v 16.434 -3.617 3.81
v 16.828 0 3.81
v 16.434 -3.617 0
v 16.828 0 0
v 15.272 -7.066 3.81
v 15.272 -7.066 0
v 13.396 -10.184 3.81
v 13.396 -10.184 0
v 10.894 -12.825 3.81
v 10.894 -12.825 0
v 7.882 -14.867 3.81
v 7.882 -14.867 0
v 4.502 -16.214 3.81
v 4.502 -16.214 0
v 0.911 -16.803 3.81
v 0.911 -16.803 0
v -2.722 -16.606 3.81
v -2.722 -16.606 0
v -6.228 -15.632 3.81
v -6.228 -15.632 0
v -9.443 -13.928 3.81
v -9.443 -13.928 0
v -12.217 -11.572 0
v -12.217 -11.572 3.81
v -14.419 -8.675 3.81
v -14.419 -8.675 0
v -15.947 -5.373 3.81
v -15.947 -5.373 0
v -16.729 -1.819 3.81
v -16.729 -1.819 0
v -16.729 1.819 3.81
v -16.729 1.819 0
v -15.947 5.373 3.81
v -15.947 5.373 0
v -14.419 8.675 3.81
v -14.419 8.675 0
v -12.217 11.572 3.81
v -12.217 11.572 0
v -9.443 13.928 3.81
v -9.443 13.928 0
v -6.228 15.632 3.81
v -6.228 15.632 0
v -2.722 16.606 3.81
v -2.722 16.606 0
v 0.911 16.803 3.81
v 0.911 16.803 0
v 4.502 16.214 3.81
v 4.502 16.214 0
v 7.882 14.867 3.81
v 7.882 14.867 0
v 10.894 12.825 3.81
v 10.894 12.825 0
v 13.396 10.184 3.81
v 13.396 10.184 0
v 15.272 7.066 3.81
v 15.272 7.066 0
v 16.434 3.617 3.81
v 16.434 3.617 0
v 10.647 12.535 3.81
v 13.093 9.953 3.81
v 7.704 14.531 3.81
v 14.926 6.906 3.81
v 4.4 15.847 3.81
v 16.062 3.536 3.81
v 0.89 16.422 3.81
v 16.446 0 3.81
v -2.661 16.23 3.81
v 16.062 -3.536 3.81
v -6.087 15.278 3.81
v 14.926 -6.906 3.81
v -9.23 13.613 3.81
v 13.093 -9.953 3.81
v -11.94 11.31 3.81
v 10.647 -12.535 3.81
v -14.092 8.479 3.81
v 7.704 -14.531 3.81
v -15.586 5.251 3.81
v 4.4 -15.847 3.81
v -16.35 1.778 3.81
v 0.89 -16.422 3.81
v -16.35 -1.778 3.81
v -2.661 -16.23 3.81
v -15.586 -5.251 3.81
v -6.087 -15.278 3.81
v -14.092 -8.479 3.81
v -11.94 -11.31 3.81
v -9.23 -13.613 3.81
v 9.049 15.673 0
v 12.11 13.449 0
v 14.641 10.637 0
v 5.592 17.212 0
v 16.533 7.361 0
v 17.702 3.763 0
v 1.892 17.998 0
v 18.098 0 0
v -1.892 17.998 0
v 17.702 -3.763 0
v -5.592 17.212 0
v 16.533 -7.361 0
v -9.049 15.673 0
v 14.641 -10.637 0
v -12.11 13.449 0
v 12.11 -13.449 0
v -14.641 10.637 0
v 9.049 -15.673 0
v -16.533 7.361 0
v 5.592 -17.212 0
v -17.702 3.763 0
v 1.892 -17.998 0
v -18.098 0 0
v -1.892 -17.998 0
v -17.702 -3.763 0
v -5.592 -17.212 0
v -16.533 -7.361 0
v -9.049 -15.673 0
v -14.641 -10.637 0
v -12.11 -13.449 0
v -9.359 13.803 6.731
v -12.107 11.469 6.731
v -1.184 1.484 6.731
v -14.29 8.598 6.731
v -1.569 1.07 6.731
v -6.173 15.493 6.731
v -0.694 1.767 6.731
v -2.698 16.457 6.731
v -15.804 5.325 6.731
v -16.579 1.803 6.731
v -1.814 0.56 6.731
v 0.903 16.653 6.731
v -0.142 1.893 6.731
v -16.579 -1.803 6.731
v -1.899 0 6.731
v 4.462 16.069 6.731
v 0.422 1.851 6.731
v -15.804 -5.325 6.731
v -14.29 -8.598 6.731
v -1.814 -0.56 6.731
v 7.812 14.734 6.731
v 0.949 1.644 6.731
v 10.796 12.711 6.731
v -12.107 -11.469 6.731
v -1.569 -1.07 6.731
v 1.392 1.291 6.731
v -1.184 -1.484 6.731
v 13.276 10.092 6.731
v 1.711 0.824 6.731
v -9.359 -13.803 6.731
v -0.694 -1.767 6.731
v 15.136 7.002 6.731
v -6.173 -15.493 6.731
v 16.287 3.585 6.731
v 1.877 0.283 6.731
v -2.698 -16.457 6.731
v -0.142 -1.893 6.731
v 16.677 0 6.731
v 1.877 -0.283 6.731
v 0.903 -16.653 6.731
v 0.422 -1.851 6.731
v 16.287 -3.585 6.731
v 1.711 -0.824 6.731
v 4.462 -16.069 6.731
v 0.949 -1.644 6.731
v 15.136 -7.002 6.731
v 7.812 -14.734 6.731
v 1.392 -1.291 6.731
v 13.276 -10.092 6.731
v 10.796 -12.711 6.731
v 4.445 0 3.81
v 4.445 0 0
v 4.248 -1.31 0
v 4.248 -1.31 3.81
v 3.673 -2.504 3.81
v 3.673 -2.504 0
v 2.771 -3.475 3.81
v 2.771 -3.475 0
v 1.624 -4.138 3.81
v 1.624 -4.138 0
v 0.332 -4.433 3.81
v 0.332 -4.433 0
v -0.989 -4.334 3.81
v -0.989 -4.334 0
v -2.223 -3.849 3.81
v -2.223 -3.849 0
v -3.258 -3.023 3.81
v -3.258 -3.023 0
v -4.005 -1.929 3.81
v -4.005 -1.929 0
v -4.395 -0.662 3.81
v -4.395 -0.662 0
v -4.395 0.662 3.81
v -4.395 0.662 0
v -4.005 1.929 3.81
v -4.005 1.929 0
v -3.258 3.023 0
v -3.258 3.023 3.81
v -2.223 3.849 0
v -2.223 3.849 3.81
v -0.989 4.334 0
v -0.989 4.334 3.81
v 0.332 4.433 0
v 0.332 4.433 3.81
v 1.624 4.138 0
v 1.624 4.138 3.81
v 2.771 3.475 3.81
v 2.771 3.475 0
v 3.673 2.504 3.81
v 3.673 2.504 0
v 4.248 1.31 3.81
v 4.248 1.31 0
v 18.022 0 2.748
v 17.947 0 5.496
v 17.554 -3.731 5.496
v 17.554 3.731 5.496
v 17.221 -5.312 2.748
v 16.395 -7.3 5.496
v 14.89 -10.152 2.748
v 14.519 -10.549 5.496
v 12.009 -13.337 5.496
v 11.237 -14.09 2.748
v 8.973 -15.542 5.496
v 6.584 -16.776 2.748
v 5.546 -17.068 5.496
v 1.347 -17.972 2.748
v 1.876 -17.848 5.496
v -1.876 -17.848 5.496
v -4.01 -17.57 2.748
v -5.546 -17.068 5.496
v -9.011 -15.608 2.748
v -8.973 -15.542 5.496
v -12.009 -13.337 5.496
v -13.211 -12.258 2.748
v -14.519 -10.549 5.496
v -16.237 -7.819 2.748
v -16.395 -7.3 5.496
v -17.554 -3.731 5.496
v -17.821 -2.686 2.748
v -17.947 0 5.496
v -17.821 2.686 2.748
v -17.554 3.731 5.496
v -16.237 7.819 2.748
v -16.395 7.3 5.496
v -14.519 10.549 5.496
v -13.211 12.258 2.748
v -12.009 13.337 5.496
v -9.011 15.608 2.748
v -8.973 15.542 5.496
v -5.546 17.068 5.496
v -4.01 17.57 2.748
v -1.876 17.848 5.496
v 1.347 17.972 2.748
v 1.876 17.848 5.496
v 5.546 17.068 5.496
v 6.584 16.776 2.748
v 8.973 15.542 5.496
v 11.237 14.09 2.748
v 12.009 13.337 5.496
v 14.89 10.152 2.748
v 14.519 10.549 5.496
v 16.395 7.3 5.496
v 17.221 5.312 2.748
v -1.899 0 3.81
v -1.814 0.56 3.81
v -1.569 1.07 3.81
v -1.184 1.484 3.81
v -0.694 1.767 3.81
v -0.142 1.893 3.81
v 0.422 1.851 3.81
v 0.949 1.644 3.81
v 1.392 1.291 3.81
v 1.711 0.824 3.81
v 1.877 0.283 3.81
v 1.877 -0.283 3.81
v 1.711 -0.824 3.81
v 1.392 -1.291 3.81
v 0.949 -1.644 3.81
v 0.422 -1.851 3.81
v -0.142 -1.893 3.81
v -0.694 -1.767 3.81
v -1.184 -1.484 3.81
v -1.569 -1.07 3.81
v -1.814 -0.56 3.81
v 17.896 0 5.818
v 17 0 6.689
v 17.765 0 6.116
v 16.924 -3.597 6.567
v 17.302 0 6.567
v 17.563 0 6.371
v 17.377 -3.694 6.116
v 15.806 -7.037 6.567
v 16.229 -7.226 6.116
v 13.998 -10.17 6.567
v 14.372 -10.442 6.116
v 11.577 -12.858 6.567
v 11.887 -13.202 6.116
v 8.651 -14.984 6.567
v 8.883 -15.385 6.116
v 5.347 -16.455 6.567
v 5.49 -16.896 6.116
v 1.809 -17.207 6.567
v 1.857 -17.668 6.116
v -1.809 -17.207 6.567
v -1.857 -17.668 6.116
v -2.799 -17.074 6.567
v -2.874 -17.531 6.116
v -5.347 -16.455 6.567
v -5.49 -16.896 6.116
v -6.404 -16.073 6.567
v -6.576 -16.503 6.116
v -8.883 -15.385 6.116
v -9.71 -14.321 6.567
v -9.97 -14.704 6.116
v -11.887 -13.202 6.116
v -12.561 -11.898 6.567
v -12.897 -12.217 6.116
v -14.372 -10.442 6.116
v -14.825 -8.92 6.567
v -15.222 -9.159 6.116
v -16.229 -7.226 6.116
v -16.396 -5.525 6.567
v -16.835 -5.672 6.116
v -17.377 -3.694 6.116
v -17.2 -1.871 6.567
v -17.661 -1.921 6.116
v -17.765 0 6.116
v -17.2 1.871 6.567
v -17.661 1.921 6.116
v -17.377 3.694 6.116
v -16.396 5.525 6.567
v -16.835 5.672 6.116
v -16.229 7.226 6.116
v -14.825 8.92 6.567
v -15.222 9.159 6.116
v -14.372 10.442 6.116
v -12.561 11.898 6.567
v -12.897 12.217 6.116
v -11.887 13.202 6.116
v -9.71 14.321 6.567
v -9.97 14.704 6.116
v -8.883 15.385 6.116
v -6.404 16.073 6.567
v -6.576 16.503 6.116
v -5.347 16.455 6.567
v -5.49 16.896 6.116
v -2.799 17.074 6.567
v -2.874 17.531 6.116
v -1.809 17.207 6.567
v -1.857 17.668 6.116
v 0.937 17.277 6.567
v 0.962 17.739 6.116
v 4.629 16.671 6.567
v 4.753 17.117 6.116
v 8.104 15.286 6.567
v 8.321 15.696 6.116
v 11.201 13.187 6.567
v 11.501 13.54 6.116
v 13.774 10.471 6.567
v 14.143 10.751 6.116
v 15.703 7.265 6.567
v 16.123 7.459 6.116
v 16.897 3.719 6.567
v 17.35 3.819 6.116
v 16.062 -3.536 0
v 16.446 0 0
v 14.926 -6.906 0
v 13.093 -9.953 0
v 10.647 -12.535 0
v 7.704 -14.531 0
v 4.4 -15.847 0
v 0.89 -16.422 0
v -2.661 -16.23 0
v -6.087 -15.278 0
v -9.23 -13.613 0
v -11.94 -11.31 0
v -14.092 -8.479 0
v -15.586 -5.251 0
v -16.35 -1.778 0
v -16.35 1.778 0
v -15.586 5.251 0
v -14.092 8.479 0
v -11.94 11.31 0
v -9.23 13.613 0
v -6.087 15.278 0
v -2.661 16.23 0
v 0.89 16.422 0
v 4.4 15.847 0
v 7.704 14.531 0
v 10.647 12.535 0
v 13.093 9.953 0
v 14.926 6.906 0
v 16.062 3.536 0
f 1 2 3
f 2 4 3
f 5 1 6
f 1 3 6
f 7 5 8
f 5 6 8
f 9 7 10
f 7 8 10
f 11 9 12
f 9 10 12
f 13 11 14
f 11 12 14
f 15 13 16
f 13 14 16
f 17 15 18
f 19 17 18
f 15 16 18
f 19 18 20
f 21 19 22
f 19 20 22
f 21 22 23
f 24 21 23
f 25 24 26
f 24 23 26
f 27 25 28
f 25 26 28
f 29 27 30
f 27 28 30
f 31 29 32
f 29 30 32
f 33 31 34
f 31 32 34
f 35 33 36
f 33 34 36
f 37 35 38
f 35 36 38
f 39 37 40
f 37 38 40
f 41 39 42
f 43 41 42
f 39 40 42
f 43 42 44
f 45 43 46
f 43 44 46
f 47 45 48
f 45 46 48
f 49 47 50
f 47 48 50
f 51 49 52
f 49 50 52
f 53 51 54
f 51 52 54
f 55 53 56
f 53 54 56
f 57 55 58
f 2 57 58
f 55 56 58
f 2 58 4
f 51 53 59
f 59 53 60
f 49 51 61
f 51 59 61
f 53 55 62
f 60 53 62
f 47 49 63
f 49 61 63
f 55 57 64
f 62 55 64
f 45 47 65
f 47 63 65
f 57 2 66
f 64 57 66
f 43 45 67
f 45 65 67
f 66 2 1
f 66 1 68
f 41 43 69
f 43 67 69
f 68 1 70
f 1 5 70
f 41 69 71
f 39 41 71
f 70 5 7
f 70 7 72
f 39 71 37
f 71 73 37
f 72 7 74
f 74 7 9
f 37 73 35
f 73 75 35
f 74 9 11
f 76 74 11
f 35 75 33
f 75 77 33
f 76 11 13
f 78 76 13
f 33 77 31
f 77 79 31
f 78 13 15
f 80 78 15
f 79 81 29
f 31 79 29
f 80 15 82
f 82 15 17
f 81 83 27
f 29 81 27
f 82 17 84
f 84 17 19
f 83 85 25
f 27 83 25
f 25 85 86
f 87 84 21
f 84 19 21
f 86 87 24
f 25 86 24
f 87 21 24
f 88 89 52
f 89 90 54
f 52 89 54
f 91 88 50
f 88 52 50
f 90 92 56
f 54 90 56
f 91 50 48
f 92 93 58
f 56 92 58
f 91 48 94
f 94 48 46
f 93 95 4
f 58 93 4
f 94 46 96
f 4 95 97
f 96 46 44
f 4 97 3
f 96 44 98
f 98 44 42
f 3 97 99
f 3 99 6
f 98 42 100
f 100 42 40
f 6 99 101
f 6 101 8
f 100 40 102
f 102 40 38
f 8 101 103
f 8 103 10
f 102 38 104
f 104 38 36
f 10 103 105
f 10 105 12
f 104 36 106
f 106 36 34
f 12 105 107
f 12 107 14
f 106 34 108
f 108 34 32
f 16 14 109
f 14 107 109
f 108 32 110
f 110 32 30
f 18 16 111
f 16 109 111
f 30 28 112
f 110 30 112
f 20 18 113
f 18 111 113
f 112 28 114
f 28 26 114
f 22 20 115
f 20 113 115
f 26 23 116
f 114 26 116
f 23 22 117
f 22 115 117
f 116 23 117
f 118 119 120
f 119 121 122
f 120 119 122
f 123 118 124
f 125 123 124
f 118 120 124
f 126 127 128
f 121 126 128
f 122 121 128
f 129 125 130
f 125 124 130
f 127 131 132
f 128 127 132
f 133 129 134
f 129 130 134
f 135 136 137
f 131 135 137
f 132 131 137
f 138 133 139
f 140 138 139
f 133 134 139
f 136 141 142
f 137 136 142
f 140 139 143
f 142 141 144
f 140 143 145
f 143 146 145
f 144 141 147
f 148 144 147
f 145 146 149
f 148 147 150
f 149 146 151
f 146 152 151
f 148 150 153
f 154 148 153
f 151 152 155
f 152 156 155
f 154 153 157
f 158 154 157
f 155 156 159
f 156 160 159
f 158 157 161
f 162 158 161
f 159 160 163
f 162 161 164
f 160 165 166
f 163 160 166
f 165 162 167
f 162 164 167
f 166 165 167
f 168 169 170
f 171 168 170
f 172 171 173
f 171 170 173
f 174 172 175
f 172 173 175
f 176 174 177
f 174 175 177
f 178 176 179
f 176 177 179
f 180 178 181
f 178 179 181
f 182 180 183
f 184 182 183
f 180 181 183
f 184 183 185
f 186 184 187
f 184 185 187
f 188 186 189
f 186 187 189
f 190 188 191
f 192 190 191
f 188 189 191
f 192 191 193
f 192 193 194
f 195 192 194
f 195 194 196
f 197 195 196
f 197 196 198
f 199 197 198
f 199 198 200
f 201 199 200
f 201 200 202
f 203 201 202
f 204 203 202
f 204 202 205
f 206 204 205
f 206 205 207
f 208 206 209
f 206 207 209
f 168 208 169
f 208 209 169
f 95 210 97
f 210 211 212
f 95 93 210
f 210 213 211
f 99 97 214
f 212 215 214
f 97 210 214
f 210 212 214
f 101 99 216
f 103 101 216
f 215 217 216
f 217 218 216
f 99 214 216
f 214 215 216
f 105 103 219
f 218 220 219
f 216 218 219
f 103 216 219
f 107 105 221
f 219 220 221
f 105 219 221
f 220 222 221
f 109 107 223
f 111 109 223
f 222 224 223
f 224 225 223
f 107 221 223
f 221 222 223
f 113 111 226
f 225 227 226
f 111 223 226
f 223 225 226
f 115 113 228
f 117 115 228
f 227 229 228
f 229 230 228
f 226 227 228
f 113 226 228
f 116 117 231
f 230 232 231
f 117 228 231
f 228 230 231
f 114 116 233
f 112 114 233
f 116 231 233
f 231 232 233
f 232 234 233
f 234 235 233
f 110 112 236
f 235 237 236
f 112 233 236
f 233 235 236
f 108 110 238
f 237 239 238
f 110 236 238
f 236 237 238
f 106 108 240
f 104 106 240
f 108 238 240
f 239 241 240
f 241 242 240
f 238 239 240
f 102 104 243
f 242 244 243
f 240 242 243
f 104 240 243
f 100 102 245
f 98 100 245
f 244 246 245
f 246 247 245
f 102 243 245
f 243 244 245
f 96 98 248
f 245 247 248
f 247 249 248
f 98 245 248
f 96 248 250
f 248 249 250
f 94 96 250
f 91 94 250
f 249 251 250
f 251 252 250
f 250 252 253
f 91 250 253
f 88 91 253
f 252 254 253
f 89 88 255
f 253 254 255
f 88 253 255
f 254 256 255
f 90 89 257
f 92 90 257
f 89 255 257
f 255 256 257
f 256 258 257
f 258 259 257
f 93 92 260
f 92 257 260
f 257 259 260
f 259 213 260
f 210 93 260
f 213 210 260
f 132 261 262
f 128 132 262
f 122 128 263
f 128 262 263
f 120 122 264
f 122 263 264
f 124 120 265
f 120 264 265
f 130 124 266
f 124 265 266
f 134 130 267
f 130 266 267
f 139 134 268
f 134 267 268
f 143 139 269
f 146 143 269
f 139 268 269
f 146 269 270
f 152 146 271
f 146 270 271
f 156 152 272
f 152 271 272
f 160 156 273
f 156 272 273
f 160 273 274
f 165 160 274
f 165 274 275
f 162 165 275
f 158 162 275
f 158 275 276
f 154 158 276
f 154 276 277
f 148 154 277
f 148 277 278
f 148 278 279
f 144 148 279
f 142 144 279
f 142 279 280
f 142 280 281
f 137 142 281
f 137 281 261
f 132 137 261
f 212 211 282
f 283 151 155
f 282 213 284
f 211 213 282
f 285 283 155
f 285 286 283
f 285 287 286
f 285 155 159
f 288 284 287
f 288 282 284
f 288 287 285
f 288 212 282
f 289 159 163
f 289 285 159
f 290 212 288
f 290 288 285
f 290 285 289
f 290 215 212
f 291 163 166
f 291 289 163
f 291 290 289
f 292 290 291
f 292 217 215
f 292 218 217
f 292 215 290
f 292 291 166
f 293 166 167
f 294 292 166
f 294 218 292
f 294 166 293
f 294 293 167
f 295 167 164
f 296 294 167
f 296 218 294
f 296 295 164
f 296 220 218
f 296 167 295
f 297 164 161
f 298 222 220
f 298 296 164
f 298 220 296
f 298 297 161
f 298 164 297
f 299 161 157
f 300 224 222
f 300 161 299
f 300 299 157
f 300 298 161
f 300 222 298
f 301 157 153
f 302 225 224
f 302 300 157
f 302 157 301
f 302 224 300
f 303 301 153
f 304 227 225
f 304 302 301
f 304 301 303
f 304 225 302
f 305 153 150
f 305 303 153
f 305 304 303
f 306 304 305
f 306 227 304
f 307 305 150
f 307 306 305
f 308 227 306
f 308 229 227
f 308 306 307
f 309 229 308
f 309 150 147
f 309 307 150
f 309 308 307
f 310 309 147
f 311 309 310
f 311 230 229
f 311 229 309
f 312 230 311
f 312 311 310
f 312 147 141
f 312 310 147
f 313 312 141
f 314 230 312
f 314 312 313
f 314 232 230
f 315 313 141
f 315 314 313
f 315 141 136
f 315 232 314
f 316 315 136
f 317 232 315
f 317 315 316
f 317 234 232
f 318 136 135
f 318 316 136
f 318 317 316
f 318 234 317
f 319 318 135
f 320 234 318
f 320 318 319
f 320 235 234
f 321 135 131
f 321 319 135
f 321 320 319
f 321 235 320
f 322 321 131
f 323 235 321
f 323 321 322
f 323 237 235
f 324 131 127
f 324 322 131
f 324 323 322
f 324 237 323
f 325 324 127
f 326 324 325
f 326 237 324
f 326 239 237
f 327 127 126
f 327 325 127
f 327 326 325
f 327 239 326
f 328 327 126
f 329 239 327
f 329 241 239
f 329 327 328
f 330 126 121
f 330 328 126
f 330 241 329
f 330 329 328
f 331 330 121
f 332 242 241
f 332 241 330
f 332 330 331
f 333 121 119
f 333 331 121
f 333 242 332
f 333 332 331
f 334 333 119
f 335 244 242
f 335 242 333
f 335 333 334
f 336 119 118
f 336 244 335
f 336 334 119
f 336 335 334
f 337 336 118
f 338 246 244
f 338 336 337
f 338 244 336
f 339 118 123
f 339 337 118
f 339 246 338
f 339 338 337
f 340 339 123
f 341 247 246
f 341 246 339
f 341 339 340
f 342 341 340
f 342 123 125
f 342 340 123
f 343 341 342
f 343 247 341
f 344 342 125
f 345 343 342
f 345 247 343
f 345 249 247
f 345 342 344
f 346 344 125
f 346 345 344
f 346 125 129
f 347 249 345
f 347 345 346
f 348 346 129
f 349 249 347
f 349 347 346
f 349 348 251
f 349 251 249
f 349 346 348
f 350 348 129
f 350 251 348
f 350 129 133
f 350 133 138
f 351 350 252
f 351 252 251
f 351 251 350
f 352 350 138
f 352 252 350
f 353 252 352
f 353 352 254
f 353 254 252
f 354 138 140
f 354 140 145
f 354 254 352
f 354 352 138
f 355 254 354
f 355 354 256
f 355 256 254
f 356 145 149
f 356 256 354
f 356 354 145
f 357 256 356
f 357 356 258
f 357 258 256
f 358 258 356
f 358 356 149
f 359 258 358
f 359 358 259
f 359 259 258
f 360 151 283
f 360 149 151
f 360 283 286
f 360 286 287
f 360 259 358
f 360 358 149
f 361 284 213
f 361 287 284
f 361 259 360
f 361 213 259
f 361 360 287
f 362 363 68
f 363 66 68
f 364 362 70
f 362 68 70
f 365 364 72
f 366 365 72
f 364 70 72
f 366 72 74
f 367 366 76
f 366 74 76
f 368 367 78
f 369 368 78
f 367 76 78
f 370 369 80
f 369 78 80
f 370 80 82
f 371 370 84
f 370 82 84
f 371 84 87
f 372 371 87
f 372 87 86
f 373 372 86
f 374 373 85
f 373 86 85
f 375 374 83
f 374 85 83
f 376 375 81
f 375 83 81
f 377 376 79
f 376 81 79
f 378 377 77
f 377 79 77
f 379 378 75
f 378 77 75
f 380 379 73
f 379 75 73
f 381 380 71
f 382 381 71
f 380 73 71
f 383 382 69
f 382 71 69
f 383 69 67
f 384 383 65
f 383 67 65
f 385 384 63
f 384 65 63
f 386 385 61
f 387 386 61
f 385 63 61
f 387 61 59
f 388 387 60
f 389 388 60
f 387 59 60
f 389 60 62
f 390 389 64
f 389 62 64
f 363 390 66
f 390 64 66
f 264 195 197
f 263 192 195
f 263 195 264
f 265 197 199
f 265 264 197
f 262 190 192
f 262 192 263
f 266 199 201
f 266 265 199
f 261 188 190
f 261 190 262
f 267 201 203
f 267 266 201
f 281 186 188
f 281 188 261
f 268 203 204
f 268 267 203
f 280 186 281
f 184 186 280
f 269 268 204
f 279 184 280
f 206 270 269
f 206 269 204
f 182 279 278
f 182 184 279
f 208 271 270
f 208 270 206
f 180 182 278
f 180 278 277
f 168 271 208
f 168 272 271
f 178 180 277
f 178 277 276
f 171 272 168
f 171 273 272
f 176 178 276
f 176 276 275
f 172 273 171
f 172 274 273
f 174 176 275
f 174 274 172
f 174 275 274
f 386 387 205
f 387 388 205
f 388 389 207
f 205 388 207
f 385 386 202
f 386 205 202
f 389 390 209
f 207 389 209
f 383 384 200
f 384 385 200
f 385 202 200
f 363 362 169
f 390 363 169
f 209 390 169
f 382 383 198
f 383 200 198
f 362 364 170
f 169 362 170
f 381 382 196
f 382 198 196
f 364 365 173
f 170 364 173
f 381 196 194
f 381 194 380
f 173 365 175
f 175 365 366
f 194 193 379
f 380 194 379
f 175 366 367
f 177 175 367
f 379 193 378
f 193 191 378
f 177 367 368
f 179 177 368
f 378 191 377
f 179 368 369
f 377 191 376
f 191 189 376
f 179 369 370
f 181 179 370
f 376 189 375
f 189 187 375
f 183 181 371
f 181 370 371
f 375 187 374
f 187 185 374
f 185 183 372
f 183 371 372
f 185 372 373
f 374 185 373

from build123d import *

# Parameters (mm, degrees)
F3_D     = 3.7973
F4_R     = 4.445
F4_R_2   = 1.89865
F5_DEPTH = 3.81
F6_R     = 1.27


with BuildPart() as f1:
    # F0 (on Front) → F1 (revolve)
    with BuildSketch(Plane.XZ):
        Polygon((17.9125677648, 6.731), (0, 6.731), (0, 0), (16.4465, 0), (16.4465, 3.81), (16.8275, 3.81), (16.8275, 0), (18.0975, 0), align=None)
    revolve(axis=Axis((0, 0, 3.3655), (0, 0, -1)))

    # F3 (through all)
    with Locations(Plane.XY.offset(6.731)):
        with Locations((0, 0)):
            Hole(F3_D / 2)

    # F4 (on face) → F5 (cut)
    with BuildSketch(Plane(origin=(0, 0, 0), x_dir=(1, 0, 0), z_dir=(0, 0, -1))):
        Circle(F4_R)
        Circle(F4_R_2, mode=Mode.SUBTRACT)
    extrude(amount=-F5_DEPTH, mode=Mode.SUBTRACT)

    # F6
    f6_edges = [f1.edges().sort_by_distance(p)[0] for p in [
        (-17.912568, 0, 6.731),
    ]]
    fillet(f6_edges, radius=F6_R)


solid = f1.part
